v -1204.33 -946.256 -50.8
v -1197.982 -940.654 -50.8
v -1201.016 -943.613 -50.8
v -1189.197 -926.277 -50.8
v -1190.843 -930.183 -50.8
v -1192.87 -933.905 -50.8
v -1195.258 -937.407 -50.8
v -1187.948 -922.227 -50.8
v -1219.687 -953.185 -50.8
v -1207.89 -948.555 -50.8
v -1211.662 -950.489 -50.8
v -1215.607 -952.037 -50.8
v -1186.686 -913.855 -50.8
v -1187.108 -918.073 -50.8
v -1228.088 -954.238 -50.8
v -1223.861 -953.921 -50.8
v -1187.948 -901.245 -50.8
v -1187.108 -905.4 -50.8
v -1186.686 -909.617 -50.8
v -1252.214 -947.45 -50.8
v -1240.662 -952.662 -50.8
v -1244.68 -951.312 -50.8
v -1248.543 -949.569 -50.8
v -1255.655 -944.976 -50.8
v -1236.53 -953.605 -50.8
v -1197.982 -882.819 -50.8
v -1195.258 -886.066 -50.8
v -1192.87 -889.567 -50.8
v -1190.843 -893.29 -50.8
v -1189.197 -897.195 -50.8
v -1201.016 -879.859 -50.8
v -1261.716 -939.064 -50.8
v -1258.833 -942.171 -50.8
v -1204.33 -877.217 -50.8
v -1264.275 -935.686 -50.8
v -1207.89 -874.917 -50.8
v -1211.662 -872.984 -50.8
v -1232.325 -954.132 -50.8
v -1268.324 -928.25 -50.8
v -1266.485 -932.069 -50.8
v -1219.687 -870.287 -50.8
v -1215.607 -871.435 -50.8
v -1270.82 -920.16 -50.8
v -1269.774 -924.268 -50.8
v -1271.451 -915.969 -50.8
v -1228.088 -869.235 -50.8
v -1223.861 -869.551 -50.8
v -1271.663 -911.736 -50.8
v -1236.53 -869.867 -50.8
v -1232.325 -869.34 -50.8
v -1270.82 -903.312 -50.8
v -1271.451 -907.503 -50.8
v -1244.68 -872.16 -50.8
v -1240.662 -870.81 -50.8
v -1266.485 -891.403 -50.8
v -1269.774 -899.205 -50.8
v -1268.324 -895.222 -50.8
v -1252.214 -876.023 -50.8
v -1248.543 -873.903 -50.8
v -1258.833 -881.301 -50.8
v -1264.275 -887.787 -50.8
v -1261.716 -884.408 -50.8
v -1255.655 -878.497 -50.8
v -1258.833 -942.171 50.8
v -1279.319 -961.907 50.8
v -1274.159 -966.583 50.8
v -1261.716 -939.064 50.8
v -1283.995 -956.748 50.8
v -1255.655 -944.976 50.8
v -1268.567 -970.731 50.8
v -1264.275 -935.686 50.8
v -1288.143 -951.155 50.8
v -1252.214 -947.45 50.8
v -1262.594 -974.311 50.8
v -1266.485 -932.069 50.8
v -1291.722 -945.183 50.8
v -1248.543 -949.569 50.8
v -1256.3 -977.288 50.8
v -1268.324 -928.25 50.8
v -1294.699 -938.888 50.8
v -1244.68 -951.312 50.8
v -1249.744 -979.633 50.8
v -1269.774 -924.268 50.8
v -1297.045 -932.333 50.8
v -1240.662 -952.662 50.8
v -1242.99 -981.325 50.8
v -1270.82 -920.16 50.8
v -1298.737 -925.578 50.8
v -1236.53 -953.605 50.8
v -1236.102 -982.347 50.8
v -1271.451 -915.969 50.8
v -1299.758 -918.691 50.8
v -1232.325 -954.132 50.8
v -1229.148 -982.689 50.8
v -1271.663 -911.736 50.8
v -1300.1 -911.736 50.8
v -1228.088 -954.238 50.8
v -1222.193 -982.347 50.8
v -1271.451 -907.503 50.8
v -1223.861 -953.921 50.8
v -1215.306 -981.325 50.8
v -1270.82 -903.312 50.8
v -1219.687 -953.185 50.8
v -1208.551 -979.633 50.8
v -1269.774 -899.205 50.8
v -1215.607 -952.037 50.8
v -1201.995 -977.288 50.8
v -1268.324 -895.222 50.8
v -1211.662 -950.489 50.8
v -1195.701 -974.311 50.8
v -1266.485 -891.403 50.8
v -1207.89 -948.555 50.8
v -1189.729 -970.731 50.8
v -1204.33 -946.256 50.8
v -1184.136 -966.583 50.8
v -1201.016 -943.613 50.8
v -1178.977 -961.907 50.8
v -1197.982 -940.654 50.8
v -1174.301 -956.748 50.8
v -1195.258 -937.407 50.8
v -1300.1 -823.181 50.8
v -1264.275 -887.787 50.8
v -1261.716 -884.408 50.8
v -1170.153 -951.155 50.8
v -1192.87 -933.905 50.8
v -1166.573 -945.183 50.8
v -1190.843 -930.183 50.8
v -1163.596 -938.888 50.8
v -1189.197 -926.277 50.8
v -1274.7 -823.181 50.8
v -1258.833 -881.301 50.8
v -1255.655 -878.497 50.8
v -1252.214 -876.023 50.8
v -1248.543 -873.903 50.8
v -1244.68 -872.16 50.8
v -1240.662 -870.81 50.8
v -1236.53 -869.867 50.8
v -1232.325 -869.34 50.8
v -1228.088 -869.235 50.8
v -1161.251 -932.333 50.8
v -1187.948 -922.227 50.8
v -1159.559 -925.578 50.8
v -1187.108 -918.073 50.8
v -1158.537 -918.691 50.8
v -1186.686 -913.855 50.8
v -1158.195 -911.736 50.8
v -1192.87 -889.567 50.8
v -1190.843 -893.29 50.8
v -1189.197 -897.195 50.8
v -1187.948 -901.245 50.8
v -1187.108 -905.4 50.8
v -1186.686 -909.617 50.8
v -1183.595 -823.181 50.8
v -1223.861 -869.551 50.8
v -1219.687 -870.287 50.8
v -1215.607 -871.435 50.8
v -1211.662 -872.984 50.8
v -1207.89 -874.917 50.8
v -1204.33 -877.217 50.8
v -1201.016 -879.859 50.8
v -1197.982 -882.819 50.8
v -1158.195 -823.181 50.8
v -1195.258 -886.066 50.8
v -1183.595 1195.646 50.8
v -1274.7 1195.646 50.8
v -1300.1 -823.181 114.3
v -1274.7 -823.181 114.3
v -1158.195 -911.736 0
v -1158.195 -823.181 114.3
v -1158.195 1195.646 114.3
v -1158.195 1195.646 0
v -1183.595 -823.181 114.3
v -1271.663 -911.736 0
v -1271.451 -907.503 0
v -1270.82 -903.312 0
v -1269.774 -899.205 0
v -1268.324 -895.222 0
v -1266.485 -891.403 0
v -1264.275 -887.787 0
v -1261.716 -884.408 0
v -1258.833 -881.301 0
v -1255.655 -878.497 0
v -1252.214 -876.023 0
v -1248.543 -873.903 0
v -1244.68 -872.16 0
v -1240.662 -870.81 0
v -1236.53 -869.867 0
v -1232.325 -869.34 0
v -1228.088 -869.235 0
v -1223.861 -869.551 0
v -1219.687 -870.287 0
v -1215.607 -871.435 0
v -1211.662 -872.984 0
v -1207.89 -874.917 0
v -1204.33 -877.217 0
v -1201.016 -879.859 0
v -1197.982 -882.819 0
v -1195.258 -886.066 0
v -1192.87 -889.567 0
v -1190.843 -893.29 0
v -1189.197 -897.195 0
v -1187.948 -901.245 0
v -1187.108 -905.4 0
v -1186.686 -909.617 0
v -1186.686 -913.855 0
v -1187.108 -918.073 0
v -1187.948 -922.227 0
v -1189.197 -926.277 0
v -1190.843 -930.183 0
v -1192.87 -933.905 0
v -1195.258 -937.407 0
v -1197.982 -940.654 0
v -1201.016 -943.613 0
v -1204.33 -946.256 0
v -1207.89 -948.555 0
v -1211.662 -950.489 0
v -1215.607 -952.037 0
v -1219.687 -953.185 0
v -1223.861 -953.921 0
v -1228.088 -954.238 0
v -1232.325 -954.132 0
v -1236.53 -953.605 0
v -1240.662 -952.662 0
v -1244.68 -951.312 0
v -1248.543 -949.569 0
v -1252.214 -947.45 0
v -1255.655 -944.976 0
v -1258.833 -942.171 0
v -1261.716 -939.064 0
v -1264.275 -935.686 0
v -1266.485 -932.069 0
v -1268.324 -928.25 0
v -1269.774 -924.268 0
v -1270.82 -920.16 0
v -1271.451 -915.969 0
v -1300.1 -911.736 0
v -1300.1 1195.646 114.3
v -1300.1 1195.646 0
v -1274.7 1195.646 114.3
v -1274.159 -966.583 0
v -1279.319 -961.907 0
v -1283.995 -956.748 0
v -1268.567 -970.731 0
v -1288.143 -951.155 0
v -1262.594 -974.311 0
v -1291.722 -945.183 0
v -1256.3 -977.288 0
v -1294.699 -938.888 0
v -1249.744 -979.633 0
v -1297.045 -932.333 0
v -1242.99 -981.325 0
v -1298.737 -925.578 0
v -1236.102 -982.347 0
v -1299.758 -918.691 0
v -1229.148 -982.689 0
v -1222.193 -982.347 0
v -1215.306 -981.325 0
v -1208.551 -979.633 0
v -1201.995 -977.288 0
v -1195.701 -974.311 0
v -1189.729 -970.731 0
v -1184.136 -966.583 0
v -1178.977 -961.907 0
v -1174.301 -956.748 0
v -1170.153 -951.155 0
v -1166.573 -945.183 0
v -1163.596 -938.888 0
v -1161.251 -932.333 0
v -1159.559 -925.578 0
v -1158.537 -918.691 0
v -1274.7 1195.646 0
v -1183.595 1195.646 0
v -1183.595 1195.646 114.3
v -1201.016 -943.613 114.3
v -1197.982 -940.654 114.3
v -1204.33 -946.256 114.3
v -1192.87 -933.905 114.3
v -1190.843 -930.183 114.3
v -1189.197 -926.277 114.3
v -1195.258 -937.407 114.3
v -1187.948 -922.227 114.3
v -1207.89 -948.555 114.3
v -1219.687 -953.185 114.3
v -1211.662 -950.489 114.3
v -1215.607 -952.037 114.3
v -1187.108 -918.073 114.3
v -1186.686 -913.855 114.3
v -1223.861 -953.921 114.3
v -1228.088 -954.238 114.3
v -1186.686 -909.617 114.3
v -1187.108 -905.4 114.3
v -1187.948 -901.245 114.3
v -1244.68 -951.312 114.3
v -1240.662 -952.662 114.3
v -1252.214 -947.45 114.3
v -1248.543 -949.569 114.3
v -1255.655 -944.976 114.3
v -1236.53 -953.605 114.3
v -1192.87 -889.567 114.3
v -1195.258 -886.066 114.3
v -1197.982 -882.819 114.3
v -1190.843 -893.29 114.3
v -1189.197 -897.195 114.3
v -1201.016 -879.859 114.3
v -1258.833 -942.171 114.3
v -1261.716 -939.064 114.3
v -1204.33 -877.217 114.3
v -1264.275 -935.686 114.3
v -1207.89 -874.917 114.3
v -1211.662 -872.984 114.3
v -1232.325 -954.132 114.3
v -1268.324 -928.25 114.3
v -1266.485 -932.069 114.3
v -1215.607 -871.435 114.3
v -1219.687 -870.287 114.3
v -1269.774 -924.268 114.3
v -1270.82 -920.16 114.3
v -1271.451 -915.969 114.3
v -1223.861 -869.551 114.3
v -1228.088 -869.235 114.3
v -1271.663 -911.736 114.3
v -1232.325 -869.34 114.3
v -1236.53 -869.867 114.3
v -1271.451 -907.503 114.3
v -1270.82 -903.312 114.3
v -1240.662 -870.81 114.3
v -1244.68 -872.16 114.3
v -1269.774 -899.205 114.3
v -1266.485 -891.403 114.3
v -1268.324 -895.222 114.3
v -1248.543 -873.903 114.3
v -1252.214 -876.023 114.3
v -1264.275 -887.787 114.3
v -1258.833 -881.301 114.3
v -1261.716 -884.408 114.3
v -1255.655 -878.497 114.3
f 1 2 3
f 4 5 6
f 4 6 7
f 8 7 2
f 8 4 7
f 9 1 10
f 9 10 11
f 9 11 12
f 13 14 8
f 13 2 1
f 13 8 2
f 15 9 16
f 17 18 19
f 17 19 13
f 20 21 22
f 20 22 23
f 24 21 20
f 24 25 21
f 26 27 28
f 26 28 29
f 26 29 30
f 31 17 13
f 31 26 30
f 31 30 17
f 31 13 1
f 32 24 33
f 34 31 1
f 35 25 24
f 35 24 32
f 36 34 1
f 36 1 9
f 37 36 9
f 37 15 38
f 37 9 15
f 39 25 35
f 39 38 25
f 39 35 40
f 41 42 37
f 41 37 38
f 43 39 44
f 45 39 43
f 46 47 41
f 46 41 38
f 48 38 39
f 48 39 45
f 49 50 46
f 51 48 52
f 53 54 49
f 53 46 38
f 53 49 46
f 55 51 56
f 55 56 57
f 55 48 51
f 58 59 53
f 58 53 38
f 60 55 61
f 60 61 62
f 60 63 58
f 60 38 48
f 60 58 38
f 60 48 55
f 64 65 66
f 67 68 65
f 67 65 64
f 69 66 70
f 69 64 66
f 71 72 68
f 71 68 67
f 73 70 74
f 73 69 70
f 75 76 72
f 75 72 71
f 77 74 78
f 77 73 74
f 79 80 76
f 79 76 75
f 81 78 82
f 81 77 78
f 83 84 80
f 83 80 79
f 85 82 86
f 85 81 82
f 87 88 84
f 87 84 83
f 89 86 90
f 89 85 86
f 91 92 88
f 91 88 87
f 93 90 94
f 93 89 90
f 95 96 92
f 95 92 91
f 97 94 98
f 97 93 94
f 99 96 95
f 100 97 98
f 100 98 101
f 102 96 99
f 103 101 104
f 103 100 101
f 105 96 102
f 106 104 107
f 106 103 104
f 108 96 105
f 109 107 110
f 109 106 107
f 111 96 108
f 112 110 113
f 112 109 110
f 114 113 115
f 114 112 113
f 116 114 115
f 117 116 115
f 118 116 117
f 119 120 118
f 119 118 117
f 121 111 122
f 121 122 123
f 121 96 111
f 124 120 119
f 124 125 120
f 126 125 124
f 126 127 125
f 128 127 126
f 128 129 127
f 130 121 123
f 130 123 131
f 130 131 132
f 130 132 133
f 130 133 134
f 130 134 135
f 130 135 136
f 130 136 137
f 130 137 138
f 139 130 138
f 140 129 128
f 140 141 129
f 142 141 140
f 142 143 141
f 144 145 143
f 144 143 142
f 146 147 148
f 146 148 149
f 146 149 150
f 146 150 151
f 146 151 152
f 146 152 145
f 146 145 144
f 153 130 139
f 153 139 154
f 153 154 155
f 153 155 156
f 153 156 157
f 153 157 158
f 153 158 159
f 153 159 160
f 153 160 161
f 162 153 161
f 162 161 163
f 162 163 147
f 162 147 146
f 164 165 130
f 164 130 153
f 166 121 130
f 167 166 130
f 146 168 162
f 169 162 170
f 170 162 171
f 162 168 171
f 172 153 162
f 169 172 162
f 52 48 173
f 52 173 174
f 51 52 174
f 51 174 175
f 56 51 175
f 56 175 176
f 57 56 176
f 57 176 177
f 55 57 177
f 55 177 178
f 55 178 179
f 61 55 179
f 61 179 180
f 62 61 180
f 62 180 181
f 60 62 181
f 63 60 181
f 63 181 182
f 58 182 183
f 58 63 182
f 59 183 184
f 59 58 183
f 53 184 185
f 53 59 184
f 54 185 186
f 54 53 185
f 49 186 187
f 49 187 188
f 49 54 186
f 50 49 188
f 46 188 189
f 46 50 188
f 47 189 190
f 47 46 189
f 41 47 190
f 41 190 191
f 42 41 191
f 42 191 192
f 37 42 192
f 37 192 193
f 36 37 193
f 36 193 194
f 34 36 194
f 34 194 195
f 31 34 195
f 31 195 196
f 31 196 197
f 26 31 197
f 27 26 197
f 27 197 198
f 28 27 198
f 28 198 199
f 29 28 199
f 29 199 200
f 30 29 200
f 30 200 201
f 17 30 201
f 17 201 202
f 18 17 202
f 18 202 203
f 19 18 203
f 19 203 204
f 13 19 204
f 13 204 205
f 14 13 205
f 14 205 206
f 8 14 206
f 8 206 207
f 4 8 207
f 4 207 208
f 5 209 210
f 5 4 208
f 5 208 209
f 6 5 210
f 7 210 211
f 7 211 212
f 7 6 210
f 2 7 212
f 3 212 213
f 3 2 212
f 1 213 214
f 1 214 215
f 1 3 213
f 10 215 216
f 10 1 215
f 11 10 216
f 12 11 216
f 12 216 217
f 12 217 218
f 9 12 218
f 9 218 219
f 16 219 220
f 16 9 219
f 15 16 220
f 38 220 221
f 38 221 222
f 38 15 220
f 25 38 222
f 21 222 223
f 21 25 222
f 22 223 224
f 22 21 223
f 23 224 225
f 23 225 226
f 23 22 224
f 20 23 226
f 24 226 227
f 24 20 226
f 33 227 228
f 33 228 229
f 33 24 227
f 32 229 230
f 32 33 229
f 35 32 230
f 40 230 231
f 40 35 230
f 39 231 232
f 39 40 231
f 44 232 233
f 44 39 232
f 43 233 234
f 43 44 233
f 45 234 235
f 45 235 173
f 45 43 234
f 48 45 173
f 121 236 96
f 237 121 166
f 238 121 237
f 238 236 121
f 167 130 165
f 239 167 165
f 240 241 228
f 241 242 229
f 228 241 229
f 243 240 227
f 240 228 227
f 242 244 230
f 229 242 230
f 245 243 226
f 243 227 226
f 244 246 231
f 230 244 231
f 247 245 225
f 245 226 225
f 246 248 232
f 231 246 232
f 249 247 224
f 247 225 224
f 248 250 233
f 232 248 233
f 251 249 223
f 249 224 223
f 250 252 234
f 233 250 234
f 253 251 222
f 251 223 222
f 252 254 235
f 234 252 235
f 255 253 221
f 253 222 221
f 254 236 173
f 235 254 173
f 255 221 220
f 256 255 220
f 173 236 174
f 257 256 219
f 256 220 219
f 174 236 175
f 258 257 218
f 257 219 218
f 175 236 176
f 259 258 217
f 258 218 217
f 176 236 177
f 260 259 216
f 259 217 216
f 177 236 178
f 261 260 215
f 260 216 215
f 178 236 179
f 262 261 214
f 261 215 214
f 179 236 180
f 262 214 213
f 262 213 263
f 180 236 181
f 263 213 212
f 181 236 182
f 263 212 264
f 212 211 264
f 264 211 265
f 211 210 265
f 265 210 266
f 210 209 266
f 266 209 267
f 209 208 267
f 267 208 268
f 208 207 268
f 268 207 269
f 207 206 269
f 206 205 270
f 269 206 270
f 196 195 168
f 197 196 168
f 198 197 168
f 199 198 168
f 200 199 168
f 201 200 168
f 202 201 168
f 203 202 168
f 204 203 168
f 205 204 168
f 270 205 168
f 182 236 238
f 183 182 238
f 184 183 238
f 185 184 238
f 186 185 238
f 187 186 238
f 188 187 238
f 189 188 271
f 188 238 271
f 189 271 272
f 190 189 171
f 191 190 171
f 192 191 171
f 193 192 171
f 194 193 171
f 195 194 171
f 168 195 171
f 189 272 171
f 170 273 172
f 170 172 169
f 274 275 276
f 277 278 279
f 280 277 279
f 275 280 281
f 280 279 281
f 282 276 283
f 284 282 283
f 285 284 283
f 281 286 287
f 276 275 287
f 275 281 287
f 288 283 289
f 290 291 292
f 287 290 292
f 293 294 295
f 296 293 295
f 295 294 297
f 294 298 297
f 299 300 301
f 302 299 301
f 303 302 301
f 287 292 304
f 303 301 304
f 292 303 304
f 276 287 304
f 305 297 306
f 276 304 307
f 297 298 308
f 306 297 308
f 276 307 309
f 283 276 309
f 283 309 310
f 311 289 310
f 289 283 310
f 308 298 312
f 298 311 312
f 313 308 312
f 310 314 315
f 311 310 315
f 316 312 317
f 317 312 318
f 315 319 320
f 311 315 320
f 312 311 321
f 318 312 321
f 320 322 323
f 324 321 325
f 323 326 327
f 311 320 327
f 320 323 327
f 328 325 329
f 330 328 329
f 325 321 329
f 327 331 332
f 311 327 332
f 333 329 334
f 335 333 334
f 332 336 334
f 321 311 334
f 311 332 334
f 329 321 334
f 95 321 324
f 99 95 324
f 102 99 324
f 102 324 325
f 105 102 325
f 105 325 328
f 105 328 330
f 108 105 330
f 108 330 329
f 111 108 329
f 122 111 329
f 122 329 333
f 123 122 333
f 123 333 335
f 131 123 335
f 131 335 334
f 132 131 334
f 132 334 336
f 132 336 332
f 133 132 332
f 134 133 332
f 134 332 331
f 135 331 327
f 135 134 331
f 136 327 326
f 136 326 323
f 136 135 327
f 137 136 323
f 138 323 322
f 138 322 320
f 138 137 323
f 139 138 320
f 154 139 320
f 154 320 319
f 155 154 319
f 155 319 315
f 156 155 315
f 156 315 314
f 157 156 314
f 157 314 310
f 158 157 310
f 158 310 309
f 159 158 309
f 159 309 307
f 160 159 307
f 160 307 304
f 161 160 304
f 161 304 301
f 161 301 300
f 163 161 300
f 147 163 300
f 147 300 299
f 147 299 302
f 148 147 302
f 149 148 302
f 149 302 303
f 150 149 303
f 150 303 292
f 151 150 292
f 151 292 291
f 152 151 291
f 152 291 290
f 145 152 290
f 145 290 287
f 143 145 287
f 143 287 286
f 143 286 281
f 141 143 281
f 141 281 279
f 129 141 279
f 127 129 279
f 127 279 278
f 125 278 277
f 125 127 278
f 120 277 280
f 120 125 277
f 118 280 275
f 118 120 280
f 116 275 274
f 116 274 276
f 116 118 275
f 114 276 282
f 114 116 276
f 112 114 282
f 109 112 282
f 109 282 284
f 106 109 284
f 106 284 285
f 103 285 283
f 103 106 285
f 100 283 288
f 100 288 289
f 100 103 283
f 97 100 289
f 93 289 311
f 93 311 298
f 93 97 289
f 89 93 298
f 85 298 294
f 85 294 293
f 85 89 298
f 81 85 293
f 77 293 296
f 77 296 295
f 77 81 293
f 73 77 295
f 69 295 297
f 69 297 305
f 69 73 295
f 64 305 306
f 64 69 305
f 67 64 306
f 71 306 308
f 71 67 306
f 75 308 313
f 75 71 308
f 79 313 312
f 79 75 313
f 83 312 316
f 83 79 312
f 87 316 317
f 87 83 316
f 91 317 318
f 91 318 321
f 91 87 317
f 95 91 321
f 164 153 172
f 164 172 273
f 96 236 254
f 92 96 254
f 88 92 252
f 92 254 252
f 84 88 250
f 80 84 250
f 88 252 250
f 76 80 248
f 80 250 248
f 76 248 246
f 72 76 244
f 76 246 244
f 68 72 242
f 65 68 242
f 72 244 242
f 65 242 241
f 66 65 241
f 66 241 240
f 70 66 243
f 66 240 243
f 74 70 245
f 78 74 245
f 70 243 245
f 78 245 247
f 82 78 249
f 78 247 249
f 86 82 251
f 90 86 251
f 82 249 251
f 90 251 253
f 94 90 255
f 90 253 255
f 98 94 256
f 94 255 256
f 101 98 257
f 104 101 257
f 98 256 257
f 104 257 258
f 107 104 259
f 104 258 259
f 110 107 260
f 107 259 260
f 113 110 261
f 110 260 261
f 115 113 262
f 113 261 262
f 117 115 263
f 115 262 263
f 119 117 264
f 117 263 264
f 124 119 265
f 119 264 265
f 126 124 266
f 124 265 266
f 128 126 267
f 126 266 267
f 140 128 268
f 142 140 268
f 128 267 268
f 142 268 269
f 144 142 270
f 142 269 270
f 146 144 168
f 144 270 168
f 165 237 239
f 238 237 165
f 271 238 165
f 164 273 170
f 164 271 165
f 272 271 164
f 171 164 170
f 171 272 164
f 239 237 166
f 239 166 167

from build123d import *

# Parameters (mm, degrees)
SKETCH1_R      = 42.514793855
EXTRUDE1_DEPTH = 50.8
SKETCH1_4_W    = 25.4
SKETCH1_4_H    = 2018.826997117
EXTRUDE2_DEPTH = 114.3
EXTRUDE3_START = 50.8
SKETCH2_R      = 42.514793855
EXTRUDE3_DEPTH = 165.1


with BuildPart() as part:
    # Sketch1 → Extrude1 (new body)
    with BuildSketch(Plane.XY):
        with BuildLine():
            Line((-1183.595391403, 1195.645715897), (-1274.700151443, 1195.645715897))
            Line((-1274.700151443, 1195.645715897), (-1274.700151443, -823.18128122))
            Line((-1274.700151443, -823.18128122), (-1300.100151443, -823.18128122))
            Line((-1300.100151443, -823.18128122), (-1300.100151443, -911.736177467))
            ThreePointArc((-1300.100151443, -911.736177467), (-1229.147771423, -982.688557487), (-1158.195391403, -911.736177467))
            Line((-1158.195391403, -911.736177467), (-1158.195391403, -823.18128122))
            Line((-1158.195391403, -823.18128122), (-1183.595391403, -823.18128122))
            Line((-1183.595391403, -823.18128122), (-1183.595391403, 1195.645715897))
        make_face()
        with Locations((-1229.147771423, -911.736177467)):
            Circle(SKETCH1_R, mode=Mode.SUBTRACT)
    extrude(amount=EXTRUDE1_DEPTH)

    # Sketch1<4> → Extrude2 (add)
    with BuildSketch(Plane.XY):
        with Locations((-1287.400151443, 186.232217339)):
            Rectangle(SKETCH1_4_W, SKETCH1_4_H)
        with Locations((-1170.895391403, 186.232217339)):
            Rectangle(SKETCH1_4_W, SKETCH1_4_H)
    extrude(amount=EXTRUDE2_DEPTH)

    # Sketch2 → Extrude3 (add)
    with BuildSketch(Plane(origin=(0, 0, 0), x_dir=(-1, 0, 0), z_dir=(0, 0, -1)).offset(EXTRUDE3_START)):
        with Locations((1229.147771423, -911.736177467)):
            Circle(SKETCH2_R)
    extrude(amount=-EXTRUDE3_DEPTH)


solid = part.part
